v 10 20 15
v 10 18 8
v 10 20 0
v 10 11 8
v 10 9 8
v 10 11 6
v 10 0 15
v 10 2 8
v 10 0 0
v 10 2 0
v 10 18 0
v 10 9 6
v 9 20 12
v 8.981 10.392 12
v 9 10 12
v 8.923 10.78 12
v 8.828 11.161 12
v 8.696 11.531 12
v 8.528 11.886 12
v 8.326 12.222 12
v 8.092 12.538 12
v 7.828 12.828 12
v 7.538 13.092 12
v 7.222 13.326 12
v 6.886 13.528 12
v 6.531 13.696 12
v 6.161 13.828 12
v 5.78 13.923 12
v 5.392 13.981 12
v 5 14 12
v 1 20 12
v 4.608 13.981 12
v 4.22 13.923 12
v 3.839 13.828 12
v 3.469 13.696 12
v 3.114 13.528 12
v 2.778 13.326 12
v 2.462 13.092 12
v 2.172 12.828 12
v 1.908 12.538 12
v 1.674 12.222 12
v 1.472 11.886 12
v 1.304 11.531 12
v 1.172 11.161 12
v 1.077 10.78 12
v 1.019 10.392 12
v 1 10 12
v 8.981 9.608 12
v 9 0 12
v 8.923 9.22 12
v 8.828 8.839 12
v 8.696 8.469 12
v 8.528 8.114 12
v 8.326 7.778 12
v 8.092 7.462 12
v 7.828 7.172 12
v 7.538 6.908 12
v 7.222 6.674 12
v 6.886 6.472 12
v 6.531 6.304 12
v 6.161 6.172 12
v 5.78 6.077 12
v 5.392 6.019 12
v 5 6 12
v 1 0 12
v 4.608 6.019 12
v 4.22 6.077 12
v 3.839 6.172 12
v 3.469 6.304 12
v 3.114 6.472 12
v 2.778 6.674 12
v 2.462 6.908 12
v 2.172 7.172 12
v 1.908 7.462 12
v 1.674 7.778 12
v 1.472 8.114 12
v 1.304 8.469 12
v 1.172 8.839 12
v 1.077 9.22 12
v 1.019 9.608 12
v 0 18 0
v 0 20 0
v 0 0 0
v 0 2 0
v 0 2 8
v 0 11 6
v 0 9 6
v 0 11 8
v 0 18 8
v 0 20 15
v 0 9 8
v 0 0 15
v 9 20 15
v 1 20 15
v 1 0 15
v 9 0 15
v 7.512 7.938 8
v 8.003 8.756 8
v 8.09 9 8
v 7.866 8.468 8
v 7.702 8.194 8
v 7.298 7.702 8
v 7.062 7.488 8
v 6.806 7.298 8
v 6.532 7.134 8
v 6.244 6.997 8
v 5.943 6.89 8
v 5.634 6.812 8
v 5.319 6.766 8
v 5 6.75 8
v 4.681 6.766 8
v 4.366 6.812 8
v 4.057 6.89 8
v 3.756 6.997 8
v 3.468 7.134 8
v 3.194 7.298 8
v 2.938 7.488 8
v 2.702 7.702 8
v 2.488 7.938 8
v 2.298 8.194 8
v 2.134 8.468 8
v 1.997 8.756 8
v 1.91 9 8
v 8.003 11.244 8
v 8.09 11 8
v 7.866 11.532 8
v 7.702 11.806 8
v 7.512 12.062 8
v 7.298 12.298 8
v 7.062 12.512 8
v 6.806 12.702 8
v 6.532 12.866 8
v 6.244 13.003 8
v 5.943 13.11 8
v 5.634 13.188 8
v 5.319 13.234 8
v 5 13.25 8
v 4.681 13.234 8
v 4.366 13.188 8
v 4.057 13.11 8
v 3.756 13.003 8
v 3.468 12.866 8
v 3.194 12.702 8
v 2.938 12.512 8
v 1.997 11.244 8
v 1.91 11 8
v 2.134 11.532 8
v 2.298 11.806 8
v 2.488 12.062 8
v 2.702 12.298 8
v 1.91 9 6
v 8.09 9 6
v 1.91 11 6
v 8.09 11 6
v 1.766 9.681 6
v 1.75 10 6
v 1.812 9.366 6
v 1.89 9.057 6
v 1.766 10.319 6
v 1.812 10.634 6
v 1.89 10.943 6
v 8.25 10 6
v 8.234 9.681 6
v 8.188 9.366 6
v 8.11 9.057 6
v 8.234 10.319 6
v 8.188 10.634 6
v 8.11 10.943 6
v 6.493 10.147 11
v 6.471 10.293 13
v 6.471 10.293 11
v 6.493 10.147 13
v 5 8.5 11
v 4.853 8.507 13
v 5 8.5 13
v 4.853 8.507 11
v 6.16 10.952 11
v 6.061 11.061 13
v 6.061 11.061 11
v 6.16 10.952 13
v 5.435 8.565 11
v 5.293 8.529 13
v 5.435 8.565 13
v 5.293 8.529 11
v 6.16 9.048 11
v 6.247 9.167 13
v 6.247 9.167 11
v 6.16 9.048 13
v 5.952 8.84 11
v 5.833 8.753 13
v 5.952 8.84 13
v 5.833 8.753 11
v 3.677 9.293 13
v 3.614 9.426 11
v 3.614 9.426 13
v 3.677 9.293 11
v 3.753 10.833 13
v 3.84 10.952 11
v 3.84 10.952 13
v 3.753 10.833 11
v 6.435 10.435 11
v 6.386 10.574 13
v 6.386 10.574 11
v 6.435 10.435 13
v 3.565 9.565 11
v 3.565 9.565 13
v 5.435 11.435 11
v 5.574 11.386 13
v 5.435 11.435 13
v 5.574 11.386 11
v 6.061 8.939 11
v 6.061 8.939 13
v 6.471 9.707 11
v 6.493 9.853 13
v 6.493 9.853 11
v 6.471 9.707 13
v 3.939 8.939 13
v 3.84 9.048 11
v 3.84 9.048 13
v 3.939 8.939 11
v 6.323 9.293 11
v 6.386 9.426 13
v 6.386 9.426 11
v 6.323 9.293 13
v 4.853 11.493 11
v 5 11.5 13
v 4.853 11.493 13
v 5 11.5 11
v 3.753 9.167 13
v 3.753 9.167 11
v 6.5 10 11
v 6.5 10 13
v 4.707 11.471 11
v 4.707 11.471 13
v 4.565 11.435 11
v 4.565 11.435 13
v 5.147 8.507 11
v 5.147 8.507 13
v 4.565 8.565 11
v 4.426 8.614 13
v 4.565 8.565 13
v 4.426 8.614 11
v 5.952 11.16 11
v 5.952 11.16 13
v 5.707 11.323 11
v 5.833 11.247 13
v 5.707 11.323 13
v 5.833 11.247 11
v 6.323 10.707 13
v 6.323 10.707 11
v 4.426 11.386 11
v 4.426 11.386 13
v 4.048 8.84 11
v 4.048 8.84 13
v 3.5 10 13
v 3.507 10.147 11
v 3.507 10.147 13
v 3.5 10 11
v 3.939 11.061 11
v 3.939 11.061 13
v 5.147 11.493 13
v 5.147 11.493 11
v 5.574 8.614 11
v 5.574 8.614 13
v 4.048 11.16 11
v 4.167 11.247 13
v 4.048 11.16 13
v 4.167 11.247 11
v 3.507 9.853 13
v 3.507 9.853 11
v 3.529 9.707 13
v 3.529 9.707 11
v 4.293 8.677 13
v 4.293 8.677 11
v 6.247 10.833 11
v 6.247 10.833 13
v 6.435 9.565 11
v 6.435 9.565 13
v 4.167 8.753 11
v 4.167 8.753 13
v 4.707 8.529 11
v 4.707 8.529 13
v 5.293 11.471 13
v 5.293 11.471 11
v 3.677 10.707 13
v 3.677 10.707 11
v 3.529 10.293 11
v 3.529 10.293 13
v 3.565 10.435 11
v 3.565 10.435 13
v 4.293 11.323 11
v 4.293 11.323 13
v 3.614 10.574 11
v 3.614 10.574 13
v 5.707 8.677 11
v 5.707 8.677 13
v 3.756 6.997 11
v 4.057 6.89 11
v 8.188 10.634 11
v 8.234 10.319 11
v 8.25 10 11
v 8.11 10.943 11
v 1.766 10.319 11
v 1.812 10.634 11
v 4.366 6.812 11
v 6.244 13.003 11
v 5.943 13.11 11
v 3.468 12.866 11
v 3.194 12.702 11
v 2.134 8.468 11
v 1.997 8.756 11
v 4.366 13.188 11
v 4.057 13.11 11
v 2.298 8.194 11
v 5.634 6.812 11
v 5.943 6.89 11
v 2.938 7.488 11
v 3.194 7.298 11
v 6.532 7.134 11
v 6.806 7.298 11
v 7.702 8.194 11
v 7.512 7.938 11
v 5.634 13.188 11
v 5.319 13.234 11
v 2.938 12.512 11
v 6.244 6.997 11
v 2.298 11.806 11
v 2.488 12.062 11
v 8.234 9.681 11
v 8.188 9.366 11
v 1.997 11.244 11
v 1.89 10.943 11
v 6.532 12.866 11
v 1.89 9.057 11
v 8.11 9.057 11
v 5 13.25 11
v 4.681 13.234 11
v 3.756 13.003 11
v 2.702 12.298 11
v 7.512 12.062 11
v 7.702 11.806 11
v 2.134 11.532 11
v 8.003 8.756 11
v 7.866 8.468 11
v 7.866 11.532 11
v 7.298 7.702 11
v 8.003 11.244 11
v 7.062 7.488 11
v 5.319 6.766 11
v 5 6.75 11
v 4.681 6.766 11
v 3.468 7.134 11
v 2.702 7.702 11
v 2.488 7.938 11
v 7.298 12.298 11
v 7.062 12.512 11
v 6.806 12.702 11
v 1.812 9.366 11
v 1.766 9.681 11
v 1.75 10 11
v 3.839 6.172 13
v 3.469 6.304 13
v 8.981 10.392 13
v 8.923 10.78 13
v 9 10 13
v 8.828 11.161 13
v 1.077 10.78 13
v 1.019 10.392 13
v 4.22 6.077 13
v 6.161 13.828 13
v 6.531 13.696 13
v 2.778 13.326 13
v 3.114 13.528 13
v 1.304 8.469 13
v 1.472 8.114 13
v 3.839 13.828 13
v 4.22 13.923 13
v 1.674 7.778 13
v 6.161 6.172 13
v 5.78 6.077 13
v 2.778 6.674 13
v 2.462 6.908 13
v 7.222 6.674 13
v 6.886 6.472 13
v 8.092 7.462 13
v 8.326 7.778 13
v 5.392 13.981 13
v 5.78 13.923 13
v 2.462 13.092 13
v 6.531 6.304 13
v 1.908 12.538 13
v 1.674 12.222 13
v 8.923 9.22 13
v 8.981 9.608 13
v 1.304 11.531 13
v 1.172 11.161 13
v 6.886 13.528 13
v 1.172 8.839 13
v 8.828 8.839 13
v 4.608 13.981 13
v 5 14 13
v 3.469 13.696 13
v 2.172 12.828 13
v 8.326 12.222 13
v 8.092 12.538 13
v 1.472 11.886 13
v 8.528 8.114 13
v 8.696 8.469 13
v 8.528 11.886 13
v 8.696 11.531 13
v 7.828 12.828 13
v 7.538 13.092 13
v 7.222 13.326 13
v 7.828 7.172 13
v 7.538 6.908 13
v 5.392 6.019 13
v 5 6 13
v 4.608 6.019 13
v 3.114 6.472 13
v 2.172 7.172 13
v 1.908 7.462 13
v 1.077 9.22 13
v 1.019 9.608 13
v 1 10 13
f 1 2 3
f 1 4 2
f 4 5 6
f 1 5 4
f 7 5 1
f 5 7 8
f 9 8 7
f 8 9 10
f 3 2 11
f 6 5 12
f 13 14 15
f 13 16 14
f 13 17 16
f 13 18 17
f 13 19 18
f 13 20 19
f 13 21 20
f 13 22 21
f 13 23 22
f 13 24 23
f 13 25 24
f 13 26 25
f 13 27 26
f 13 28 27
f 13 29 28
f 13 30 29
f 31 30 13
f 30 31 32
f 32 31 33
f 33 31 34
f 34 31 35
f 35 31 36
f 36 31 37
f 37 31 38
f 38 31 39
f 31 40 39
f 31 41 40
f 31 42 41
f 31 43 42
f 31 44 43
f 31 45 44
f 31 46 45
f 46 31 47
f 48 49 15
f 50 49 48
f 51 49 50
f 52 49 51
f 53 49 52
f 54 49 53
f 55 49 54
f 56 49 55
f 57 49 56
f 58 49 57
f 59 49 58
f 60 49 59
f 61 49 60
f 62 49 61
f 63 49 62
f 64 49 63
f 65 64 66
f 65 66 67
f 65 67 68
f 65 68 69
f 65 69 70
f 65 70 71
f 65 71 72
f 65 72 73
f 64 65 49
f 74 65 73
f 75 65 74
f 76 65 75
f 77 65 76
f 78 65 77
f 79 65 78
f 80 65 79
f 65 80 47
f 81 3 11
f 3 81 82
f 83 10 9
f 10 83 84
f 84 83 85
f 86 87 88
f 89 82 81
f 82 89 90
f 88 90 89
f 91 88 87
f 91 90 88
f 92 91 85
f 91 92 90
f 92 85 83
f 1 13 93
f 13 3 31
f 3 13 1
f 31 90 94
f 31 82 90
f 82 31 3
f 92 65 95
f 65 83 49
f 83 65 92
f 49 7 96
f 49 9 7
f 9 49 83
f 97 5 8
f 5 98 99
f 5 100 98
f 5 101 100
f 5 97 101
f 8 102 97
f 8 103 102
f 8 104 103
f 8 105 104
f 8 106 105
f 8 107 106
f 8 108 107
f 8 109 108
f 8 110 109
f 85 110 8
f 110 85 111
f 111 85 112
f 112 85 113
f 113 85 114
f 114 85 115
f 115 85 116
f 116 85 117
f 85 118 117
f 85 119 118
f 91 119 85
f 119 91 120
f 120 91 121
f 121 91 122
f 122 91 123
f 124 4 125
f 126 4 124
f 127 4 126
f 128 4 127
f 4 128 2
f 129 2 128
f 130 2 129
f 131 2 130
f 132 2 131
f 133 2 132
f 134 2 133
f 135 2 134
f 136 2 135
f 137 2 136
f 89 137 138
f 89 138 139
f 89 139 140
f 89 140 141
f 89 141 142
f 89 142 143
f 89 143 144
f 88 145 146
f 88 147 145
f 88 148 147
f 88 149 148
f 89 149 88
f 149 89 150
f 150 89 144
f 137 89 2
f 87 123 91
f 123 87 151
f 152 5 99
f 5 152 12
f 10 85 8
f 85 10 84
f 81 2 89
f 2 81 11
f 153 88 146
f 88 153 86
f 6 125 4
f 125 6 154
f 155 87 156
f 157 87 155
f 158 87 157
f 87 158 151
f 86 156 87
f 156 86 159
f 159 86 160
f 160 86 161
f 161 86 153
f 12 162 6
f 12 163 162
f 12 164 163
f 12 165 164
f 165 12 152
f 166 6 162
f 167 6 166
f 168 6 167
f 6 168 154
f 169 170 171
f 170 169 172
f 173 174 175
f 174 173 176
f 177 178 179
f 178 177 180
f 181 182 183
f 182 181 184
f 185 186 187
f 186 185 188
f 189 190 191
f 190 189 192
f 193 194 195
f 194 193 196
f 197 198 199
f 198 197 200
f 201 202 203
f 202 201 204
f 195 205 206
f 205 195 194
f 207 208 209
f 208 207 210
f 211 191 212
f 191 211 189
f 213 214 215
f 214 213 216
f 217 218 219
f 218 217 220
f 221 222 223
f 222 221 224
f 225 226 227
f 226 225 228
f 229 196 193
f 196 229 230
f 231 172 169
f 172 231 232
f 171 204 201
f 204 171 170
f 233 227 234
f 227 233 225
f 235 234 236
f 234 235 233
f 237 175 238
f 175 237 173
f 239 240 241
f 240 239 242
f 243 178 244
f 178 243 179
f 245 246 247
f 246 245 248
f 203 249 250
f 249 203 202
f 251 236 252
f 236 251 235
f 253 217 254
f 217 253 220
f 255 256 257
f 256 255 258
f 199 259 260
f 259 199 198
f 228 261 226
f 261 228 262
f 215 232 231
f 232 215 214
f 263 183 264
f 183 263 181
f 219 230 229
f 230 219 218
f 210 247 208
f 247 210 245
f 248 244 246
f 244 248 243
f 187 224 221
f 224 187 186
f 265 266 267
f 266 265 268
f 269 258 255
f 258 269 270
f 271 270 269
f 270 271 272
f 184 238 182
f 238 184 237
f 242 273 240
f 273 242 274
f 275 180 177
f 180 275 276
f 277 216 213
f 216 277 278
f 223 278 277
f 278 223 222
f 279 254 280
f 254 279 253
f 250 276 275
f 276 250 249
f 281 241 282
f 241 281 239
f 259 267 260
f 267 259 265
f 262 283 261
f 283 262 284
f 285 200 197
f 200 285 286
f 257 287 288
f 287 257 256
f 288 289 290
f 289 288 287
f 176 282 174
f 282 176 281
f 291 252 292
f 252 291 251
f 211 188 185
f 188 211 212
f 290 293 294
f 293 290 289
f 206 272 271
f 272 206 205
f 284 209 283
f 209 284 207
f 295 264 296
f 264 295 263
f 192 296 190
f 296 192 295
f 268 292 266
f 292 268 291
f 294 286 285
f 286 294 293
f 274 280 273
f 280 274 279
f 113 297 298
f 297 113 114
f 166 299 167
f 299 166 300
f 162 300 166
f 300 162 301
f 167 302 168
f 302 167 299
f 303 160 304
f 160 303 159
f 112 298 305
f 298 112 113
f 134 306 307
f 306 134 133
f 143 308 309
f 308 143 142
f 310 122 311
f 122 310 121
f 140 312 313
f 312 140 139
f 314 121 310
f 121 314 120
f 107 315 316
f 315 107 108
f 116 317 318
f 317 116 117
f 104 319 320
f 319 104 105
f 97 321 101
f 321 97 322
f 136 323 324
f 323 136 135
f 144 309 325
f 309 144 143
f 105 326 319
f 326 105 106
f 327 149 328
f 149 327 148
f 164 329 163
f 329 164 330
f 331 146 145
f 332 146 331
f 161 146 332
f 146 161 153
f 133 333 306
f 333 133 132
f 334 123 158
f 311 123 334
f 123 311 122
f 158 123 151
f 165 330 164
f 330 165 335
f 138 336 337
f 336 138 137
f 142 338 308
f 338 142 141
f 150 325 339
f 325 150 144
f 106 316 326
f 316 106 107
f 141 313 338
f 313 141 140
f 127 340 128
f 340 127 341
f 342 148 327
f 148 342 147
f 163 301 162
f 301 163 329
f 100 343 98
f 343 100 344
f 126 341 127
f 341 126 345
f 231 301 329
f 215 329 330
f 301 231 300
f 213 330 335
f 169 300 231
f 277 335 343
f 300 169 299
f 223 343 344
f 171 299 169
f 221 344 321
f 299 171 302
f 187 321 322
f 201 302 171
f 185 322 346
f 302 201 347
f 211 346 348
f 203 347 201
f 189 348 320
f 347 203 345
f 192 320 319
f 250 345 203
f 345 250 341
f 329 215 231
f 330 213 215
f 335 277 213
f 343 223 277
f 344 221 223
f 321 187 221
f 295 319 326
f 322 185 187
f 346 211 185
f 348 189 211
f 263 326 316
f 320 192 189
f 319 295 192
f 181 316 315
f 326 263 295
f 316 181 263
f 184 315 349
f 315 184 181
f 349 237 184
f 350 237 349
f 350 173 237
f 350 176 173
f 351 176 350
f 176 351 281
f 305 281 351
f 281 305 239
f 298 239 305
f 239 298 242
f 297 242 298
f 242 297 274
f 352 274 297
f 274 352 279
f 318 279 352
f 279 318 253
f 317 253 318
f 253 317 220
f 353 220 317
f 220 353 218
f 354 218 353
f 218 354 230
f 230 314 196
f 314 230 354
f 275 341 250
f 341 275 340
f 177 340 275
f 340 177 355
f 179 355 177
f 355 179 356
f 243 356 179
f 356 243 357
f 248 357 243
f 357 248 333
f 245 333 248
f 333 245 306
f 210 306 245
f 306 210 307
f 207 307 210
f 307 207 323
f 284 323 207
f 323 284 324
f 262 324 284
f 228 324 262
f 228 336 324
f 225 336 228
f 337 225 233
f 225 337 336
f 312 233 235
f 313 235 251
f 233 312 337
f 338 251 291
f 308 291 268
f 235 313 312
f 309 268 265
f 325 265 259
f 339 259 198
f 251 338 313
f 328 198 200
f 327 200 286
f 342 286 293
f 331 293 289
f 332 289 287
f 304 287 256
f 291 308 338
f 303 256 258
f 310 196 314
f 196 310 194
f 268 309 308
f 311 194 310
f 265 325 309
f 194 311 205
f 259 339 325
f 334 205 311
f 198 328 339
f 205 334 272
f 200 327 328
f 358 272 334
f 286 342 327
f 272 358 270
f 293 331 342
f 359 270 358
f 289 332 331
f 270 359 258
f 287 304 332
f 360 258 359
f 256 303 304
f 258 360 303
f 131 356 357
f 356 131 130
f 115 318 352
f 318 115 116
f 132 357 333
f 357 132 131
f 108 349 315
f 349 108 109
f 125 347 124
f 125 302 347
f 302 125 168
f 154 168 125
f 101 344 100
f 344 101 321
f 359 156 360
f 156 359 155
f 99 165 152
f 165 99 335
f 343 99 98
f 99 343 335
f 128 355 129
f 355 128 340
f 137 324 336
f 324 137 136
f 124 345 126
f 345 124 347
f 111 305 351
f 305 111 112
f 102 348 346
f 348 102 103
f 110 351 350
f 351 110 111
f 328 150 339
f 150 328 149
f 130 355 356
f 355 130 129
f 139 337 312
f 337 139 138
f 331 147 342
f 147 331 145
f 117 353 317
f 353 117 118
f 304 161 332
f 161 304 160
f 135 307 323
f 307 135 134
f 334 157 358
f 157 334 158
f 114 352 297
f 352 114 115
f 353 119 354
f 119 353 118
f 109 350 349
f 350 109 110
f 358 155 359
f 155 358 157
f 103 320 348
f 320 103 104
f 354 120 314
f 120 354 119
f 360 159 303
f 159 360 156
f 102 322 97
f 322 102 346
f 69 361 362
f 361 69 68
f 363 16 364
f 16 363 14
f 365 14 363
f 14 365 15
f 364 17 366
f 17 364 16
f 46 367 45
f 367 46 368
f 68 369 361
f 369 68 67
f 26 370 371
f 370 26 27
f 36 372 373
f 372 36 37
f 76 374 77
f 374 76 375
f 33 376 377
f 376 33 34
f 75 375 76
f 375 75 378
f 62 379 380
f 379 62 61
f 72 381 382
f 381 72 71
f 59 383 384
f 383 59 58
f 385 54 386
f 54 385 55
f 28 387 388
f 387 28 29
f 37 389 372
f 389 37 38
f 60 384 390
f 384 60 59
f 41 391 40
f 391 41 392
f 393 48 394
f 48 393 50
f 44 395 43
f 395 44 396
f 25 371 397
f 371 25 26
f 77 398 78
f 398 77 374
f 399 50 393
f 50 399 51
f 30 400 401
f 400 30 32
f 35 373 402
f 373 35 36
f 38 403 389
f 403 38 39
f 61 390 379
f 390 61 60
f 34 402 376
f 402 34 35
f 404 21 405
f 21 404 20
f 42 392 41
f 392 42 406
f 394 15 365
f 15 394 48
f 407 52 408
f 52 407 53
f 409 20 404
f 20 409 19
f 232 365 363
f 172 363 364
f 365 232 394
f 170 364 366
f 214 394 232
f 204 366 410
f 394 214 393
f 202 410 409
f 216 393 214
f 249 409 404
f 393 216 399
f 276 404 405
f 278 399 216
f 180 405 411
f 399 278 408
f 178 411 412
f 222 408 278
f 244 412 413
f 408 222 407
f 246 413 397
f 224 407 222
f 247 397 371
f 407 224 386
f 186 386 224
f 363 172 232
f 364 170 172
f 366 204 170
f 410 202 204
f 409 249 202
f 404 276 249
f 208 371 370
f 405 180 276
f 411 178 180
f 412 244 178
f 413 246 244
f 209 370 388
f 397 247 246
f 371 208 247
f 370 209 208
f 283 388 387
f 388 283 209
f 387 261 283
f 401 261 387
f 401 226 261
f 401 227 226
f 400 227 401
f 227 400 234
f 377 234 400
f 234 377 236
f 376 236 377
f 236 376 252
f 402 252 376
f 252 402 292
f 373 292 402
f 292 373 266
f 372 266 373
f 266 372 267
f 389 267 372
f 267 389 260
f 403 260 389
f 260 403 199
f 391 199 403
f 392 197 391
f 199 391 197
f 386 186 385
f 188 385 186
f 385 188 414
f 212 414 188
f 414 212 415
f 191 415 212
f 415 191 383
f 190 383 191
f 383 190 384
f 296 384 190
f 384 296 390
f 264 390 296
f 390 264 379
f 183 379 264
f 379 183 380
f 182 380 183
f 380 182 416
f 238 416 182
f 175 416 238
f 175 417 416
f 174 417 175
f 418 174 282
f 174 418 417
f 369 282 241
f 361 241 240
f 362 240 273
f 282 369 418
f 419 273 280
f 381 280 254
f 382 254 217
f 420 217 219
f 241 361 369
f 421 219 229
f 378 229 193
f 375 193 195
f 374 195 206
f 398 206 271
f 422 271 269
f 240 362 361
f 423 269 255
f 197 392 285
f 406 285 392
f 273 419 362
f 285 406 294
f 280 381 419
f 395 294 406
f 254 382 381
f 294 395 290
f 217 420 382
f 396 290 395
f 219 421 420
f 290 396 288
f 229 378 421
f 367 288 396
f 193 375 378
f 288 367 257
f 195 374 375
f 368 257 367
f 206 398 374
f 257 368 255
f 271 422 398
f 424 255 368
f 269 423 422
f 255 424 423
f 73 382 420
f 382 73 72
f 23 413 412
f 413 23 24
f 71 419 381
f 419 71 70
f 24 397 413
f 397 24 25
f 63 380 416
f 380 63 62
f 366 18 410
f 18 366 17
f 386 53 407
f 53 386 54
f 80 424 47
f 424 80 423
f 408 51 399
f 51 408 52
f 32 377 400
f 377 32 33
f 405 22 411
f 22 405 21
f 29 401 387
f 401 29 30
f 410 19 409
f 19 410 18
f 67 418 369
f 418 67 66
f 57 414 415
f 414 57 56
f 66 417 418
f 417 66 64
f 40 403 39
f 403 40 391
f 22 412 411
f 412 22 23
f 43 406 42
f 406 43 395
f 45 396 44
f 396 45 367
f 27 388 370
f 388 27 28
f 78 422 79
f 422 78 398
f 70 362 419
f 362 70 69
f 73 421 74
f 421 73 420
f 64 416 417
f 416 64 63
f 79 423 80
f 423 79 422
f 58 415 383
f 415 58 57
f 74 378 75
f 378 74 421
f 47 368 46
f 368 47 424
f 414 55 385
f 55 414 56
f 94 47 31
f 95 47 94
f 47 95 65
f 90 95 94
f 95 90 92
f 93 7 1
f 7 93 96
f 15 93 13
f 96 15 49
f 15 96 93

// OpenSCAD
$fn = 64;

length = 10;

connector = 0;

r = 1.5;

difference(){

        translate(  [ 0, 0, 0 ] ) cube ( [ length , 20 , 12 ] );
    
        translate(  [ 0 , 2, 0 ] ) cube ( [ length , 7 , 8 ] ); 
  
        translate(  [ 0 , 11, 0 ] ) cube ( [ length , 7 , 8 ] ); 
   
        translate(  [ 0 , 9 , 0 ] ) cube ( [ length , 7 , 6 ] );  
       
        translate(  [ 5, 10, 8 ] )  cylinder( 8 , r , r );
       
        translate(  [ 5, 10, 6 ] )  cylinder( 5 , 3.25, 3.25);
    
    
    
}
 

    translate(  [ 0, 0, 12 ] ) cube ( [ 1 , 20 , 3 ] );

    translate(  [ length - 1 , 0, 12 ] ) cube ( [ 1 , 20 , 3 ] );
    

difference(){
    translate(  [ 5, 10, 12 ] )  cylinder( 1 , 4 , 4 );
    
    translate(  [ 5, 10, 12 ] )  cylinder( 1 , r , r );
    
}
